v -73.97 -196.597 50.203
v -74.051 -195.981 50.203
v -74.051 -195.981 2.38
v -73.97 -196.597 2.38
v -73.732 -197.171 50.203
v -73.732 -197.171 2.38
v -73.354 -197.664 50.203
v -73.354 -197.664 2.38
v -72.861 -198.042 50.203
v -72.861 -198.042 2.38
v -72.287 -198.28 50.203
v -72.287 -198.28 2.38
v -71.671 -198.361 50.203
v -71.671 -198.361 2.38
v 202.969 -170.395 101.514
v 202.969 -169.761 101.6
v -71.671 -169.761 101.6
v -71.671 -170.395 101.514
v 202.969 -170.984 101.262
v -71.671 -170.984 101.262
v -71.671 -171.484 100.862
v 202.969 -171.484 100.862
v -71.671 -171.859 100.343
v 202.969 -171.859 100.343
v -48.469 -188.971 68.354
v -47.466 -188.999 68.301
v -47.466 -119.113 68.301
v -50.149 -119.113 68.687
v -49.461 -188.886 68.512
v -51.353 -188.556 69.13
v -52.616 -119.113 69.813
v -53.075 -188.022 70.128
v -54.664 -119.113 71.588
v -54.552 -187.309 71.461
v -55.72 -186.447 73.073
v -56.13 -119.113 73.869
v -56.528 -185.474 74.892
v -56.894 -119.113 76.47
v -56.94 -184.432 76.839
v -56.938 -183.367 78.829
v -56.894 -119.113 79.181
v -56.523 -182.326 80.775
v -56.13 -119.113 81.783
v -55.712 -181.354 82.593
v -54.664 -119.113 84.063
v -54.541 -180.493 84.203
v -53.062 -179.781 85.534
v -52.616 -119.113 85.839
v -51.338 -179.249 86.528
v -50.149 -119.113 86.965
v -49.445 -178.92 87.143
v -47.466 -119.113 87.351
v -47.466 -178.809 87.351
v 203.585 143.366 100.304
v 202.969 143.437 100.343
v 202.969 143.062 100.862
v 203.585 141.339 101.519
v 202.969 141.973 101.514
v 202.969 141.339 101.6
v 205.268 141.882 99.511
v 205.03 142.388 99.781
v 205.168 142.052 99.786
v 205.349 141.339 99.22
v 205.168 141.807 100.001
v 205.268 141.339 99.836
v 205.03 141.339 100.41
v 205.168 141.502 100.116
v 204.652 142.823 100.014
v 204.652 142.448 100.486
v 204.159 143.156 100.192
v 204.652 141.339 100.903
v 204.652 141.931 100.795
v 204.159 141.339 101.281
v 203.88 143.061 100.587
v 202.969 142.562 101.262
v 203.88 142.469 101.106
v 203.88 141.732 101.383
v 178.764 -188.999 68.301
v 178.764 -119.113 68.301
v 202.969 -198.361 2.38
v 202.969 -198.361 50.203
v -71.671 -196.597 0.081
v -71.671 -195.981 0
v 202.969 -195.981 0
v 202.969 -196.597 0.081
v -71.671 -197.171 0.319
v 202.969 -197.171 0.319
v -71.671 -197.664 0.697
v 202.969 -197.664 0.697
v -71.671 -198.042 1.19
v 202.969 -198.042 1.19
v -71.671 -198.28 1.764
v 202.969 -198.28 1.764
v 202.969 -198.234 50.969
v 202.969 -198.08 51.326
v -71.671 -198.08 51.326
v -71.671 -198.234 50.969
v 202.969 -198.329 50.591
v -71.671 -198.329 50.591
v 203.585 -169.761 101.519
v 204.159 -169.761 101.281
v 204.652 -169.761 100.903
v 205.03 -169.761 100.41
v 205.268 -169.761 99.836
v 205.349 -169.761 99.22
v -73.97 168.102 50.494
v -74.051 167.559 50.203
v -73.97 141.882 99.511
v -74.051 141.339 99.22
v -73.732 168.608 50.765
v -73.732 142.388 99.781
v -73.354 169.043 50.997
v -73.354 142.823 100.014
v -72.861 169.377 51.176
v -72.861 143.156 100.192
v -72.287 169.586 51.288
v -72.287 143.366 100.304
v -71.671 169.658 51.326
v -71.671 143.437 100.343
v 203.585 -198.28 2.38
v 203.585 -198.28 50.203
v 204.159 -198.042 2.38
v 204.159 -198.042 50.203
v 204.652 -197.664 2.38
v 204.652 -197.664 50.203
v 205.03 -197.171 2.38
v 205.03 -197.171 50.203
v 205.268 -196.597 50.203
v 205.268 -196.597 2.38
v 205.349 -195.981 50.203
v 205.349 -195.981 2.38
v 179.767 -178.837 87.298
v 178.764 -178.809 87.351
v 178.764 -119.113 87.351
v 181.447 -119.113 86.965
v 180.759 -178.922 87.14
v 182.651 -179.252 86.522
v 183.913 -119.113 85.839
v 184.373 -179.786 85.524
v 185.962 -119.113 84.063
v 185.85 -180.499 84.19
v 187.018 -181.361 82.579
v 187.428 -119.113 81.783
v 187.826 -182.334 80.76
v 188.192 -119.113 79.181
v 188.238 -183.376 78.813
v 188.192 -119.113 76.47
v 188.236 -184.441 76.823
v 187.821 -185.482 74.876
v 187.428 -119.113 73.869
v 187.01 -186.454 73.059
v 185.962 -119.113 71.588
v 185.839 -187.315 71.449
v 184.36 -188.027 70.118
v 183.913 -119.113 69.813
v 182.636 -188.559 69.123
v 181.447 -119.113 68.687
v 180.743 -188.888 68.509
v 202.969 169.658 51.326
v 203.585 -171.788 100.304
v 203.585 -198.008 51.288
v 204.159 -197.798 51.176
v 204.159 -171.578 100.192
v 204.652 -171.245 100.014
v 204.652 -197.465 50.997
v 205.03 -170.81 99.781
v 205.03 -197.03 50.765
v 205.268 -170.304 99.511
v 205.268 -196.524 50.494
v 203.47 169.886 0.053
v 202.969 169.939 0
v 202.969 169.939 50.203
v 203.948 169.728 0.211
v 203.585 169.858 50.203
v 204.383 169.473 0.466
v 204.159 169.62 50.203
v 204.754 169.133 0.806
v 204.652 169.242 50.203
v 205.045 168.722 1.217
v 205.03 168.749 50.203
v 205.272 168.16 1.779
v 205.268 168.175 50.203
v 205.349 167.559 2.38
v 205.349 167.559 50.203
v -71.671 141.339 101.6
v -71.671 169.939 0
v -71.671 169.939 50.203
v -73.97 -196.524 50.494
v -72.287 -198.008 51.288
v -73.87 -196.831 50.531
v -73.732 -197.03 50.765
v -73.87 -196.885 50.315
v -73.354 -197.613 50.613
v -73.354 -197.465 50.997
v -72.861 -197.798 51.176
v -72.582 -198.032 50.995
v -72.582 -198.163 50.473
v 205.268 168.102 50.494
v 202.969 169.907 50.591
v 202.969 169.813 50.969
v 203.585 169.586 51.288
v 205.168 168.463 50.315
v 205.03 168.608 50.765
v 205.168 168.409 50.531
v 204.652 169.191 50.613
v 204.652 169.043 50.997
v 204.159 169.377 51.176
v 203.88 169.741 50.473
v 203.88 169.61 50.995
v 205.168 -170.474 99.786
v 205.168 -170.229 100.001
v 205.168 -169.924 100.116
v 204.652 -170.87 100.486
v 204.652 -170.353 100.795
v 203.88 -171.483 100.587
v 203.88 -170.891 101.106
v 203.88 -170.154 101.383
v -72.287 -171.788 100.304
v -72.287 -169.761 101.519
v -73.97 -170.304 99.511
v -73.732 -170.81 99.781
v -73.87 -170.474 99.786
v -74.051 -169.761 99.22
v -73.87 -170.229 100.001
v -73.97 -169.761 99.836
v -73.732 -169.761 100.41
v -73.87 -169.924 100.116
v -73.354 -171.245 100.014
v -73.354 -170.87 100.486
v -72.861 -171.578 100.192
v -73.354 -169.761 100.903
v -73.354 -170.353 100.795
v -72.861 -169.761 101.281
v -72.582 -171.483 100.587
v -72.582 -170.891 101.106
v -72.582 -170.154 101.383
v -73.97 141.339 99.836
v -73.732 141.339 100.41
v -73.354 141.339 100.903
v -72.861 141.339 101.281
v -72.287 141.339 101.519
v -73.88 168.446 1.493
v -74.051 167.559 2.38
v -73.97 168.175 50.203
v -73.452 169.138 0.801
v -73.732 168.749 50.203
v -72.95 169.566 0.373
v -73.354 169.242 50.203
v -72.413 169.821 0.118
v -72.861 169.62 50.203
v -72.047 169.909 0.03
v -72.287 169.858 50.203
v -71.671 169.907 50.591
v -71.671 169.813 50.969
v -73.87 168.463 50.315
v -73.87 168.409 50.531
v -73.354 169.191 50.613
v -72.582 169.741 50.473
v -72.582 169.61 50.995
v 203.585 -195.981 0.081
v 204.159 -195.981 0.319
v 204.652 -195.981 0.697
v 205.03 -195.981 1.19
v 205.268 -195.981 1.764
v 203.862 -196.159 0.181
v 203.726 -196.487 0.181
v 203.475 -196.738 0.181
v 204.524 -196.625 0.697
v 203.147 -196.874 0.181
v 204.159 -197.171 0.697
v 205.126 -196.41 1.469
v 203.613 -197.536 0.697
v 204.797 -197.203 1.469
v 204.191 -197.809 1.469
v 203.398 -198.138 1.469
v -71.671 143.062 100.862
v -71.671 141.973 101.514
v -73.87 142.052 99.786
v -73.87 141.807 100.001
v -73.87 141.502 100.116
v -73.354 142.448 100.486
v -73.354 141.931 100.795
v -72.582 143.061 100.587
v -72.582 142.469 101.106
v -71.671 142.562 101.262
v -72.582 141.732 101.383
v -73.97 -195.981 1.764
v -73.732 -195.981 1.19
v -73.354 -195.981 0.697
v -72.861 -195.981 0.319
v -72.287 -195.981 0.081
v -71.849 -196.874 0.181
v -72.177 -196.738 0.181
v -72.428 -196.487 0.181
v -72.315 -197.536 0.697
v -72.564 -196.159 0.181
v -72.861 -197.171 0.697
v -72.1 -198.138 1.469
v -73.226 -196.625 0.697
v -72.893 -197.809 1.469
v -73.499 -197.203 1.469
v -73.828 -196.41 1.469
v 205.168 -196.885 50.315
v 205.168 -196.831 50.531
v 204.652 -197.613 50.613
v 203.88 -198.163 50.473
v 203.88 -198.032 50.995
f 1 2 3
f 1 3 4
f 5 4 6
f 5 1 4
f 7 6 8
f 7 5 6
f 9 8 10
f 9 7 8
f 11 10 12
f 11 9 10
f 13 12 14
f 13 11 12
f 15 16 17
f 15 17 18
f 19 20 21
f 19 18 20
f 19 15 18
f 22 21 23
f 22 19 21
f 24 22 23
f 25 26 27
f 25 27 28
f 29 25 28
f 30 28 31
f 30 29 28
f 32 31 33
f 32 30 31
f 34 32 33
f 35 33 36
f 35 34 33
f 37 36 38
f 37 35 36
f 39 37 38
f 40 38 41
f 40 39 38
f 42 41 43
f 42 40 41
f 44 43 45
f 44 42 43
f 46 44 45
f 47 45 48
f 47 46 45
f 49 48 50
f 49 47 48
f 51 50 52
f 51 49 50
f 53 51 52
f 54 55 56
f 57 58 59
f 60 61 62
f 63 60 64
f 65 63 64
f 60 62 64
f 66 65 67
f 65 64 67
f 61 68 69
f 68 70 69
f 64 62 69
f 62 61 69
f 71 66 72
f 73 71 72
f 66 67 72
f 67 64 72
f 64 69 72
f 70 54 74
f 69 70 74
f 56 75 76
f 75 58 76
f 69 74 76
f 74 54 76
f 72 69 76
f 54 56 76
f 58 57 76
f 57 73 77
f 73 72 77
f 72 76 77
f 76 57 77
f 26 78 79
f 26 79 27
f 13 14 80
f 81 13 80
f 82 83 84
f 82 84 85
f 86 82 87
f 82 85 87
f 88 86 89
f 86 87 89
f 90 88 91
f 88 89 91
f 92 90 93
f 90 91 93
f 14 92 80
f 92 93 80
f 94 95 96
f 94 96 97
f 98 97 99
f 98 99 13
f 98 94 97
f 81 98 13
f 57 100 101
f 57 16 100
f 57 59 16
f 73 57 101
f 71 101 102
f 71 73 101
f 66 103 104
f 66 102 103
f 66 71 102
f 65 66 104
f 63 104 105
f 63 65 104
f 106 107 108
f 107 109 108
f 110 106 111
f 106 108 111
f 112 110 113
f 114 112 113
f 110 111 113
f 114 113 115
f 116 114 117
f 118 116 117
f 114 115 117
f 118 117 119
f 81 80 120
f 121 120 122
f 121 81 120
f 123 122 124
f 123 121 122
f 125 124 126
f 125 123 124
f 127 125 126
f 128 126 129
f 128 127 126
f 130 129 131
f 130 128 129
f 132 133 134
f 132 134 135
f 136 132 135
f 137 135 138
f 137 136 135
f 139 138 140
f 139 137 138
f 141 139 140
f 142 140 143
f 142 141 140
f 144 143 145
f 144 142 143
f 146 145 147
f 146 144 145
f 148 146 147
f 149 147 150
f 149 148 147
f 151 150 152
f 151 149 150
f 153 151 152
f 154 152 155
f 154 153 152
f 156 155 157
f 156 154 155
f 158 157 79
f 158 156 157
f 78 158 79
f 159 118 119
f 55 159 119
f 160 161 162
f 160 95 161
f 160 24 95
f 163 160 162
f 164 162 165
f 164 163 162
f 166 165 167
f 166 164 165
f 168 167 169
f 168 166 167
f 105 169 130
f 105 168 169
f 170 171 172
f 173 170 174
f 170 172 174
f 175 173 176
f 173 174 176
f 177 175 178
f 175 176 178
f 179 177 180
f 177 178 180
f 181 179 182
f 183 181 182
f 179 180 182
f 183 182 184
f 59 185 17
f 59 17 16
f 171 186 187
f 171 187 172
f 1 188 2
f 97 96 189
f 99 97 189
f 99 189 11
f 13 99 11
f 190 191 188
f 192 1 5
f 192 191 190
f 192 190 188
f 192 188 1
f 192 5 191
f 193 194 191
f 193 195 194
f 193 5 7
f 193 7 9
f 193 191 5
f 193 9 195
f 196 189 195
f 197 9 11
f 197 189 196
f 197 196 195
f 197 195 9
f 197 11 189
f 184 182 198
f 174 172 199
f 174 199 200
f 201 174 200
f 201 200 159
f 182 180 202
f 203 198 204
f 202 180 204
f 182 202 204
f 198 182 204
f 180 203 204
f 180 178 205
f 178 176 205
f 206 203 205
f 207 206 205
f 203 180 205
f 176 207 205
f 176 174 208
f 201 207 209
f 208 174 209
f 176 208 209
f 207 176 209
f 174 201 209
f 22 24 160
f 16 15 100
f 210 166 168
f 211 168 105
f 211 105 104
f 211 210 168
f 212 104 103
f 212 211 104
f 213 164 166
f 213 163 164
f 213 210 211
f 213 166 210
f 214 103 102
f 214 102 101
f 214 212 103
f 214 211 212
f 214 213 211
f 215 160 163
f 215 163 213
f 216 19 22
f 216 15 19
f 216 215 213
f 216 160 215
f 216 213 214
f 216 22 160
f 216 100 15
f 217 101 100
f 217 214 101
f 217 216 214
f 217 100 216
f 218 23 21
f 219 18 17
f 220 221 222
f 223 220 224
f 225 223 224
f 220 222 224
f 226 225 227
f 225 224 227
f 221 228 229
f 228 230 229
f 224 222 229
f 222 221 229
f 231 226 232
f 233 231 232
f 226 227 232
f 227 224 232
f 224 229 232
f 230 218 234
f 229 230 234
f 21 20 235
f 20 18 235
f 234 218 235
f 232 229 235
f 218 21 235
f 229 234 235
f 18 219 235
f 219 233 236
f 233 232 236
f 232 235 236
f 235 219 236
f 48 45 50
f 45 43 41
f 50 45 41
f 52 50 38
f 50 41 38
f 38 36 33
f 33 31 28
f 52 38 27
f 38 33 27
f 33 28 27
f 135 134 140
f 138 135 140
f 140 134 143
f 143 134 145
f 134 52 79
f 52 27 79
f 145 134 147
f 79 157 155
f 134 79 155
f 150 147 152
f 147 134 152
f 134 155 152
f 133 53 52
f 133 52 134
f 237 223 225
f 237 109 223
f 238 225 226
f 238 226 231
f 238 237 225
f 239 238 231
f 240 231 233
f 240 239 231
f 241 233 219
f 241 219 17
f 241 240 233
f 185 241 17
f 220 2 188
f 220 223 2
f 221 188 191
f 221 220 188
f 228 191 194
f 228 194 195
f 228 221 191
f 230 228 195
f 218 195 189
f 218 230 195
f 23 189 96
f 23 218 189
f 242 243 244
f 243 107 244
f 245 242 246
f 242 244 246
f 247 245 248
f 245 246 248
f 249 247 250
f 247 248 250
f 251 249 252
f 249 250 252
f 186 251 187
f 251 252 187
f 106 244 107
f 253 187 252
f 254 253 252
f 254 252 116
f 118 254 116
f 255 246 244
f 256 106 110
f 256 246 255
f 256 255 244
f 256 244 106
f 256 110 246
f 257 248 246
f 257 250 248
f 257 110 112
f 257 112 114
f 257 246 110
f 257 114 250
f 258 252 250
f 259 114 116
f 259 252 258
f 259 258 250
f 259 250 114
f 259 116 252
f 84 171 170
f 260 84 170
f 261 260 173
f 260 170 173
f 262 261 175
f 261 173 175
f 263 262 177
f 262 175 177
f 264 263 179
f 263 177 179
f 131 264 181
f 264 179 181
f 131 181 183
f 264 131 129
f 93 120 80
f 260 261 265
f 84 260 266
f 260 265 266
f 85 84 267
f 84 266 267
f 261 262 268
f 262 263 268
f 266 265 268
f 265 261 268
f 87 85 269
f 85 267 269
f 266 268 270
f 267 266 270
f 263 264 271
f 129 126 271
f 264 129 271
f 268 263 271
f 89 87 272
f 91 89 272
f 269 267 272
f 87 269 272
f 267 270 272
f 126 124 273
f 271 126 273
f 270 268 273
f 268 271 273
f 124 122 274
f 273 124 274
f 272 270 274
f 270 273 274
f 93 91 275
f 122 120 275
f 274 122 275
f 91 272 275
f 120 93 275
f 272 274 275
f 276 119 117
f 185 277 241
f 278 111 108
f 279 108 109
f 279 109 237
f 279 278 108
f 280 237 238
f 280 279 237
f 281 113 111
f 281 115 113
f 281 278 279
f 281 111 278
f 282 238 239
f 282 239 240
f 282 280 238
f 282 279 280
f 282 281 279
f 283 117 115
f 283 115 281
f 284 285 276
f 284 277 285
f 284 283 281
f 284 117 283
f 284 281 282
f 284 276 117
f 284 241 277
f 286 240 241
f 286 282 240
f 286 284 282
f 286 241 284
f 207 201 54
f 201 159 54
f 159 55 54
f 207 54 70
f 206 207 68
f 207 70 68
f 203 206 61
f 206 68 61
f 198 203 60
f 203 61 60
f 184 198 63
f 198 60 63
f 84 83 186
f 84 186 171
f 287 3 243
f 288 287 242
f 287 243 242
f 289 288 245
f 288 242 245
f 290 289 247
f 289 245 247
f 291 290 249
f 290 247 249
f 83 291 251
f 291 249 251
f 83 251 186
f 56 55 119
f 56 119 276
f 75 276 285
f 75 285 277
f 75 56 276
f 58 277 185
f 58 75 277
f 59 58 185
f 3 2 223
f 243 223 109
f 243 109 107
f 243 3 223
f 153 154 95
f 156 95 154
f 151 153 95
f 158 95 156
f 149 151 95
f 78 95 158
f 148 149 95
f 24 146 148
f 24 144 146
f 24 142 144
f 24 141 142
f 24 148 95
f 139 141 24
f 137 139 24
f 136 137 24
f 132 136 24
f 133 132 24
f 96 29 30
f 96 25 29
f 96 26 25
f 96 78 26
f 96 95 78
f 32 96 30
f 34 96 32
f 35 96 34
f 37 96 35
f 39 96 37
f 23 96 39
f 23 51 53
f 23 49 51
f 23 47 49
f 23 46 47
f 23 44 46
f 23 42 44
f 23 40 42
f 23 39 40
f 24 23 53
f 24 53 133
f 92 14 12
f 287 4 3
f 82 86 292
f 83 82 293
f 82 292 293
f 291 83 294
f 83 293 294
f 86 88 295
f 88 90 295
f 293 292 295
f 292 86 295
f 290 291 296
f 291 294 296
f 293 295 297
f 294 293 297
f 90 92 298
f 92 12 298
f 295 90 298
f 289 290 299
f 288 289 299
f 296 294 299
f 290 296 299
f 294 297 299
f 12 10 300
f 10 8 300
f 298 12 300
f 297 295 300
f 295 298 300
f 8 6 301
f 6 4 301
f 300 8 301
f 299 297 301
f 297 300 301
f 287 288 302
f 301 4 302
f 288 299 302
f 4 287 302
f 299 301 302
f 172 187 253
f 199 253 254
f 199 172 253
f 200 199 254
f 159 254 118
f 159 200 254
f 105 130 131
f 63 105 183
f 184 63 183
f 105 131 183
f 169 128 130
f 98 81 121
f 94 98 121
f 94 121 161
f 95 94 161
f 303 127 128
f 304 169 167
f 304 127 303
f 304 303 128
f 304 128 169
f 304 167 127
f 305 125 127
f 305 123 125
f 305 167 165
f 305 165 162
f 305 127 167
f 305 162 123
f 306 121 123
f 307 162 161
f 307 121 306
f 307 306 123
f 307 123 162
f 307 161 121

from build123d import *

# Parameters (mm, degrees)
SKETCH1_W           = 279.4
SKETCH1_H           = 368.3
BOSS_EXTRUDE1_DEPTH = 101.6
CUT_EXTRUDE2_DEPTH  = 343.662
CUT_EXTRUDE3_DEPTH  = 81.788
FILLET2_R           = 2.38


with BuildPart() as part:
    # Sketch1 → Boss-Extrude1 (new body)
    with BuildSketch(Plane.XY):
        with Locations((65.648946297, -14.210932476)):
            Rectangle(SKETCH1_W, SKETCH1_H)
    extrude(amount=BOSS_EXTRUDE1_DEPTH)

    # Sketch5 → Cut-Extrude2 (cut)
    with BuildSketch(Plane.ZY.offset(74.051053703)):
        Polygon((50.8, 169.939067524), (101.6, 142.764720342), (197.27126928, 191.743775141), (59.221541493, 225.542979991), align=None)
        Polygon((197.27126928, -220.165640093), (59.221541493, -253.964844943), (50.8, -198.360932476), (101.6, -171.186585294), align=None)
    extrude(amount=-CUT_EXTRUDE2_DEPTH, mode=Mode.SUBTRACT)

    # Sketch6 → Cut-Extrude3 (cut)
    with BuildSketch(Plane(origin=(0, -200.900932476, 0), x_dir=(-1, 0, 0), z_dir=(0, -1, 0))):
        with BuildLine():
            Line((47.465898878, -87.350896203), (-178.763791471, -87.350896203))
            ThreePointArc((-178.763791471, -87.350896203), (-188.288791471, -77.825896203), (-178.763791471, -68.300896203))
            Line((-178.763791471, -68.300896203), (47.465898878, -68.300896203))
            ThreePointArc((47.465898878, -68.300896203), (56.990898878, -77.825896203), (47.465898878, -87.350896203))
        make_face()
    extrude(amount=-CUT_EXTRUDE3_DEPTH, mode=Mode.SUBTRACT)

    # Fillet2
    fillet2_edges = [part.edges().sort_by_distance(p)[0] for p in [
        (-74.051053703, -14.210932476, 101.6),
        (205.348946297, -14.210932476, 101.6),
        (65.648946297, -171.186585294, 101.6),
        (65.648946297, 142.764720342, 101.6),
        (-74.051053703, 169.939067524, 25.4),
        (205.348946297, 169.939067524, 25.4),
        (205.348946297, -198.360932476, 25.4),
        (-74.051053703, -198.360932476, 25.4),
        (205.348946297, 156.351893933, 76.2),
        (-74.051053703, 156.351893933, 76.2),
        (65.648946297, 169.939067524, 50.8),
        (205.348946297, -184.773758885, 76.2),
        (65.648946297, -198.360932476, 50.8),
        (-74.051053703, -184.773758885, 76.2),
        (205.348946297, -14.210932476, 0),
        (65.648946297, -198.360932476, 0),
        (-74.051053703, -14.210932476, 0),
    ]]
    fillet(fillet2_edges, radius=FILLET2_R)


solid = part.part
